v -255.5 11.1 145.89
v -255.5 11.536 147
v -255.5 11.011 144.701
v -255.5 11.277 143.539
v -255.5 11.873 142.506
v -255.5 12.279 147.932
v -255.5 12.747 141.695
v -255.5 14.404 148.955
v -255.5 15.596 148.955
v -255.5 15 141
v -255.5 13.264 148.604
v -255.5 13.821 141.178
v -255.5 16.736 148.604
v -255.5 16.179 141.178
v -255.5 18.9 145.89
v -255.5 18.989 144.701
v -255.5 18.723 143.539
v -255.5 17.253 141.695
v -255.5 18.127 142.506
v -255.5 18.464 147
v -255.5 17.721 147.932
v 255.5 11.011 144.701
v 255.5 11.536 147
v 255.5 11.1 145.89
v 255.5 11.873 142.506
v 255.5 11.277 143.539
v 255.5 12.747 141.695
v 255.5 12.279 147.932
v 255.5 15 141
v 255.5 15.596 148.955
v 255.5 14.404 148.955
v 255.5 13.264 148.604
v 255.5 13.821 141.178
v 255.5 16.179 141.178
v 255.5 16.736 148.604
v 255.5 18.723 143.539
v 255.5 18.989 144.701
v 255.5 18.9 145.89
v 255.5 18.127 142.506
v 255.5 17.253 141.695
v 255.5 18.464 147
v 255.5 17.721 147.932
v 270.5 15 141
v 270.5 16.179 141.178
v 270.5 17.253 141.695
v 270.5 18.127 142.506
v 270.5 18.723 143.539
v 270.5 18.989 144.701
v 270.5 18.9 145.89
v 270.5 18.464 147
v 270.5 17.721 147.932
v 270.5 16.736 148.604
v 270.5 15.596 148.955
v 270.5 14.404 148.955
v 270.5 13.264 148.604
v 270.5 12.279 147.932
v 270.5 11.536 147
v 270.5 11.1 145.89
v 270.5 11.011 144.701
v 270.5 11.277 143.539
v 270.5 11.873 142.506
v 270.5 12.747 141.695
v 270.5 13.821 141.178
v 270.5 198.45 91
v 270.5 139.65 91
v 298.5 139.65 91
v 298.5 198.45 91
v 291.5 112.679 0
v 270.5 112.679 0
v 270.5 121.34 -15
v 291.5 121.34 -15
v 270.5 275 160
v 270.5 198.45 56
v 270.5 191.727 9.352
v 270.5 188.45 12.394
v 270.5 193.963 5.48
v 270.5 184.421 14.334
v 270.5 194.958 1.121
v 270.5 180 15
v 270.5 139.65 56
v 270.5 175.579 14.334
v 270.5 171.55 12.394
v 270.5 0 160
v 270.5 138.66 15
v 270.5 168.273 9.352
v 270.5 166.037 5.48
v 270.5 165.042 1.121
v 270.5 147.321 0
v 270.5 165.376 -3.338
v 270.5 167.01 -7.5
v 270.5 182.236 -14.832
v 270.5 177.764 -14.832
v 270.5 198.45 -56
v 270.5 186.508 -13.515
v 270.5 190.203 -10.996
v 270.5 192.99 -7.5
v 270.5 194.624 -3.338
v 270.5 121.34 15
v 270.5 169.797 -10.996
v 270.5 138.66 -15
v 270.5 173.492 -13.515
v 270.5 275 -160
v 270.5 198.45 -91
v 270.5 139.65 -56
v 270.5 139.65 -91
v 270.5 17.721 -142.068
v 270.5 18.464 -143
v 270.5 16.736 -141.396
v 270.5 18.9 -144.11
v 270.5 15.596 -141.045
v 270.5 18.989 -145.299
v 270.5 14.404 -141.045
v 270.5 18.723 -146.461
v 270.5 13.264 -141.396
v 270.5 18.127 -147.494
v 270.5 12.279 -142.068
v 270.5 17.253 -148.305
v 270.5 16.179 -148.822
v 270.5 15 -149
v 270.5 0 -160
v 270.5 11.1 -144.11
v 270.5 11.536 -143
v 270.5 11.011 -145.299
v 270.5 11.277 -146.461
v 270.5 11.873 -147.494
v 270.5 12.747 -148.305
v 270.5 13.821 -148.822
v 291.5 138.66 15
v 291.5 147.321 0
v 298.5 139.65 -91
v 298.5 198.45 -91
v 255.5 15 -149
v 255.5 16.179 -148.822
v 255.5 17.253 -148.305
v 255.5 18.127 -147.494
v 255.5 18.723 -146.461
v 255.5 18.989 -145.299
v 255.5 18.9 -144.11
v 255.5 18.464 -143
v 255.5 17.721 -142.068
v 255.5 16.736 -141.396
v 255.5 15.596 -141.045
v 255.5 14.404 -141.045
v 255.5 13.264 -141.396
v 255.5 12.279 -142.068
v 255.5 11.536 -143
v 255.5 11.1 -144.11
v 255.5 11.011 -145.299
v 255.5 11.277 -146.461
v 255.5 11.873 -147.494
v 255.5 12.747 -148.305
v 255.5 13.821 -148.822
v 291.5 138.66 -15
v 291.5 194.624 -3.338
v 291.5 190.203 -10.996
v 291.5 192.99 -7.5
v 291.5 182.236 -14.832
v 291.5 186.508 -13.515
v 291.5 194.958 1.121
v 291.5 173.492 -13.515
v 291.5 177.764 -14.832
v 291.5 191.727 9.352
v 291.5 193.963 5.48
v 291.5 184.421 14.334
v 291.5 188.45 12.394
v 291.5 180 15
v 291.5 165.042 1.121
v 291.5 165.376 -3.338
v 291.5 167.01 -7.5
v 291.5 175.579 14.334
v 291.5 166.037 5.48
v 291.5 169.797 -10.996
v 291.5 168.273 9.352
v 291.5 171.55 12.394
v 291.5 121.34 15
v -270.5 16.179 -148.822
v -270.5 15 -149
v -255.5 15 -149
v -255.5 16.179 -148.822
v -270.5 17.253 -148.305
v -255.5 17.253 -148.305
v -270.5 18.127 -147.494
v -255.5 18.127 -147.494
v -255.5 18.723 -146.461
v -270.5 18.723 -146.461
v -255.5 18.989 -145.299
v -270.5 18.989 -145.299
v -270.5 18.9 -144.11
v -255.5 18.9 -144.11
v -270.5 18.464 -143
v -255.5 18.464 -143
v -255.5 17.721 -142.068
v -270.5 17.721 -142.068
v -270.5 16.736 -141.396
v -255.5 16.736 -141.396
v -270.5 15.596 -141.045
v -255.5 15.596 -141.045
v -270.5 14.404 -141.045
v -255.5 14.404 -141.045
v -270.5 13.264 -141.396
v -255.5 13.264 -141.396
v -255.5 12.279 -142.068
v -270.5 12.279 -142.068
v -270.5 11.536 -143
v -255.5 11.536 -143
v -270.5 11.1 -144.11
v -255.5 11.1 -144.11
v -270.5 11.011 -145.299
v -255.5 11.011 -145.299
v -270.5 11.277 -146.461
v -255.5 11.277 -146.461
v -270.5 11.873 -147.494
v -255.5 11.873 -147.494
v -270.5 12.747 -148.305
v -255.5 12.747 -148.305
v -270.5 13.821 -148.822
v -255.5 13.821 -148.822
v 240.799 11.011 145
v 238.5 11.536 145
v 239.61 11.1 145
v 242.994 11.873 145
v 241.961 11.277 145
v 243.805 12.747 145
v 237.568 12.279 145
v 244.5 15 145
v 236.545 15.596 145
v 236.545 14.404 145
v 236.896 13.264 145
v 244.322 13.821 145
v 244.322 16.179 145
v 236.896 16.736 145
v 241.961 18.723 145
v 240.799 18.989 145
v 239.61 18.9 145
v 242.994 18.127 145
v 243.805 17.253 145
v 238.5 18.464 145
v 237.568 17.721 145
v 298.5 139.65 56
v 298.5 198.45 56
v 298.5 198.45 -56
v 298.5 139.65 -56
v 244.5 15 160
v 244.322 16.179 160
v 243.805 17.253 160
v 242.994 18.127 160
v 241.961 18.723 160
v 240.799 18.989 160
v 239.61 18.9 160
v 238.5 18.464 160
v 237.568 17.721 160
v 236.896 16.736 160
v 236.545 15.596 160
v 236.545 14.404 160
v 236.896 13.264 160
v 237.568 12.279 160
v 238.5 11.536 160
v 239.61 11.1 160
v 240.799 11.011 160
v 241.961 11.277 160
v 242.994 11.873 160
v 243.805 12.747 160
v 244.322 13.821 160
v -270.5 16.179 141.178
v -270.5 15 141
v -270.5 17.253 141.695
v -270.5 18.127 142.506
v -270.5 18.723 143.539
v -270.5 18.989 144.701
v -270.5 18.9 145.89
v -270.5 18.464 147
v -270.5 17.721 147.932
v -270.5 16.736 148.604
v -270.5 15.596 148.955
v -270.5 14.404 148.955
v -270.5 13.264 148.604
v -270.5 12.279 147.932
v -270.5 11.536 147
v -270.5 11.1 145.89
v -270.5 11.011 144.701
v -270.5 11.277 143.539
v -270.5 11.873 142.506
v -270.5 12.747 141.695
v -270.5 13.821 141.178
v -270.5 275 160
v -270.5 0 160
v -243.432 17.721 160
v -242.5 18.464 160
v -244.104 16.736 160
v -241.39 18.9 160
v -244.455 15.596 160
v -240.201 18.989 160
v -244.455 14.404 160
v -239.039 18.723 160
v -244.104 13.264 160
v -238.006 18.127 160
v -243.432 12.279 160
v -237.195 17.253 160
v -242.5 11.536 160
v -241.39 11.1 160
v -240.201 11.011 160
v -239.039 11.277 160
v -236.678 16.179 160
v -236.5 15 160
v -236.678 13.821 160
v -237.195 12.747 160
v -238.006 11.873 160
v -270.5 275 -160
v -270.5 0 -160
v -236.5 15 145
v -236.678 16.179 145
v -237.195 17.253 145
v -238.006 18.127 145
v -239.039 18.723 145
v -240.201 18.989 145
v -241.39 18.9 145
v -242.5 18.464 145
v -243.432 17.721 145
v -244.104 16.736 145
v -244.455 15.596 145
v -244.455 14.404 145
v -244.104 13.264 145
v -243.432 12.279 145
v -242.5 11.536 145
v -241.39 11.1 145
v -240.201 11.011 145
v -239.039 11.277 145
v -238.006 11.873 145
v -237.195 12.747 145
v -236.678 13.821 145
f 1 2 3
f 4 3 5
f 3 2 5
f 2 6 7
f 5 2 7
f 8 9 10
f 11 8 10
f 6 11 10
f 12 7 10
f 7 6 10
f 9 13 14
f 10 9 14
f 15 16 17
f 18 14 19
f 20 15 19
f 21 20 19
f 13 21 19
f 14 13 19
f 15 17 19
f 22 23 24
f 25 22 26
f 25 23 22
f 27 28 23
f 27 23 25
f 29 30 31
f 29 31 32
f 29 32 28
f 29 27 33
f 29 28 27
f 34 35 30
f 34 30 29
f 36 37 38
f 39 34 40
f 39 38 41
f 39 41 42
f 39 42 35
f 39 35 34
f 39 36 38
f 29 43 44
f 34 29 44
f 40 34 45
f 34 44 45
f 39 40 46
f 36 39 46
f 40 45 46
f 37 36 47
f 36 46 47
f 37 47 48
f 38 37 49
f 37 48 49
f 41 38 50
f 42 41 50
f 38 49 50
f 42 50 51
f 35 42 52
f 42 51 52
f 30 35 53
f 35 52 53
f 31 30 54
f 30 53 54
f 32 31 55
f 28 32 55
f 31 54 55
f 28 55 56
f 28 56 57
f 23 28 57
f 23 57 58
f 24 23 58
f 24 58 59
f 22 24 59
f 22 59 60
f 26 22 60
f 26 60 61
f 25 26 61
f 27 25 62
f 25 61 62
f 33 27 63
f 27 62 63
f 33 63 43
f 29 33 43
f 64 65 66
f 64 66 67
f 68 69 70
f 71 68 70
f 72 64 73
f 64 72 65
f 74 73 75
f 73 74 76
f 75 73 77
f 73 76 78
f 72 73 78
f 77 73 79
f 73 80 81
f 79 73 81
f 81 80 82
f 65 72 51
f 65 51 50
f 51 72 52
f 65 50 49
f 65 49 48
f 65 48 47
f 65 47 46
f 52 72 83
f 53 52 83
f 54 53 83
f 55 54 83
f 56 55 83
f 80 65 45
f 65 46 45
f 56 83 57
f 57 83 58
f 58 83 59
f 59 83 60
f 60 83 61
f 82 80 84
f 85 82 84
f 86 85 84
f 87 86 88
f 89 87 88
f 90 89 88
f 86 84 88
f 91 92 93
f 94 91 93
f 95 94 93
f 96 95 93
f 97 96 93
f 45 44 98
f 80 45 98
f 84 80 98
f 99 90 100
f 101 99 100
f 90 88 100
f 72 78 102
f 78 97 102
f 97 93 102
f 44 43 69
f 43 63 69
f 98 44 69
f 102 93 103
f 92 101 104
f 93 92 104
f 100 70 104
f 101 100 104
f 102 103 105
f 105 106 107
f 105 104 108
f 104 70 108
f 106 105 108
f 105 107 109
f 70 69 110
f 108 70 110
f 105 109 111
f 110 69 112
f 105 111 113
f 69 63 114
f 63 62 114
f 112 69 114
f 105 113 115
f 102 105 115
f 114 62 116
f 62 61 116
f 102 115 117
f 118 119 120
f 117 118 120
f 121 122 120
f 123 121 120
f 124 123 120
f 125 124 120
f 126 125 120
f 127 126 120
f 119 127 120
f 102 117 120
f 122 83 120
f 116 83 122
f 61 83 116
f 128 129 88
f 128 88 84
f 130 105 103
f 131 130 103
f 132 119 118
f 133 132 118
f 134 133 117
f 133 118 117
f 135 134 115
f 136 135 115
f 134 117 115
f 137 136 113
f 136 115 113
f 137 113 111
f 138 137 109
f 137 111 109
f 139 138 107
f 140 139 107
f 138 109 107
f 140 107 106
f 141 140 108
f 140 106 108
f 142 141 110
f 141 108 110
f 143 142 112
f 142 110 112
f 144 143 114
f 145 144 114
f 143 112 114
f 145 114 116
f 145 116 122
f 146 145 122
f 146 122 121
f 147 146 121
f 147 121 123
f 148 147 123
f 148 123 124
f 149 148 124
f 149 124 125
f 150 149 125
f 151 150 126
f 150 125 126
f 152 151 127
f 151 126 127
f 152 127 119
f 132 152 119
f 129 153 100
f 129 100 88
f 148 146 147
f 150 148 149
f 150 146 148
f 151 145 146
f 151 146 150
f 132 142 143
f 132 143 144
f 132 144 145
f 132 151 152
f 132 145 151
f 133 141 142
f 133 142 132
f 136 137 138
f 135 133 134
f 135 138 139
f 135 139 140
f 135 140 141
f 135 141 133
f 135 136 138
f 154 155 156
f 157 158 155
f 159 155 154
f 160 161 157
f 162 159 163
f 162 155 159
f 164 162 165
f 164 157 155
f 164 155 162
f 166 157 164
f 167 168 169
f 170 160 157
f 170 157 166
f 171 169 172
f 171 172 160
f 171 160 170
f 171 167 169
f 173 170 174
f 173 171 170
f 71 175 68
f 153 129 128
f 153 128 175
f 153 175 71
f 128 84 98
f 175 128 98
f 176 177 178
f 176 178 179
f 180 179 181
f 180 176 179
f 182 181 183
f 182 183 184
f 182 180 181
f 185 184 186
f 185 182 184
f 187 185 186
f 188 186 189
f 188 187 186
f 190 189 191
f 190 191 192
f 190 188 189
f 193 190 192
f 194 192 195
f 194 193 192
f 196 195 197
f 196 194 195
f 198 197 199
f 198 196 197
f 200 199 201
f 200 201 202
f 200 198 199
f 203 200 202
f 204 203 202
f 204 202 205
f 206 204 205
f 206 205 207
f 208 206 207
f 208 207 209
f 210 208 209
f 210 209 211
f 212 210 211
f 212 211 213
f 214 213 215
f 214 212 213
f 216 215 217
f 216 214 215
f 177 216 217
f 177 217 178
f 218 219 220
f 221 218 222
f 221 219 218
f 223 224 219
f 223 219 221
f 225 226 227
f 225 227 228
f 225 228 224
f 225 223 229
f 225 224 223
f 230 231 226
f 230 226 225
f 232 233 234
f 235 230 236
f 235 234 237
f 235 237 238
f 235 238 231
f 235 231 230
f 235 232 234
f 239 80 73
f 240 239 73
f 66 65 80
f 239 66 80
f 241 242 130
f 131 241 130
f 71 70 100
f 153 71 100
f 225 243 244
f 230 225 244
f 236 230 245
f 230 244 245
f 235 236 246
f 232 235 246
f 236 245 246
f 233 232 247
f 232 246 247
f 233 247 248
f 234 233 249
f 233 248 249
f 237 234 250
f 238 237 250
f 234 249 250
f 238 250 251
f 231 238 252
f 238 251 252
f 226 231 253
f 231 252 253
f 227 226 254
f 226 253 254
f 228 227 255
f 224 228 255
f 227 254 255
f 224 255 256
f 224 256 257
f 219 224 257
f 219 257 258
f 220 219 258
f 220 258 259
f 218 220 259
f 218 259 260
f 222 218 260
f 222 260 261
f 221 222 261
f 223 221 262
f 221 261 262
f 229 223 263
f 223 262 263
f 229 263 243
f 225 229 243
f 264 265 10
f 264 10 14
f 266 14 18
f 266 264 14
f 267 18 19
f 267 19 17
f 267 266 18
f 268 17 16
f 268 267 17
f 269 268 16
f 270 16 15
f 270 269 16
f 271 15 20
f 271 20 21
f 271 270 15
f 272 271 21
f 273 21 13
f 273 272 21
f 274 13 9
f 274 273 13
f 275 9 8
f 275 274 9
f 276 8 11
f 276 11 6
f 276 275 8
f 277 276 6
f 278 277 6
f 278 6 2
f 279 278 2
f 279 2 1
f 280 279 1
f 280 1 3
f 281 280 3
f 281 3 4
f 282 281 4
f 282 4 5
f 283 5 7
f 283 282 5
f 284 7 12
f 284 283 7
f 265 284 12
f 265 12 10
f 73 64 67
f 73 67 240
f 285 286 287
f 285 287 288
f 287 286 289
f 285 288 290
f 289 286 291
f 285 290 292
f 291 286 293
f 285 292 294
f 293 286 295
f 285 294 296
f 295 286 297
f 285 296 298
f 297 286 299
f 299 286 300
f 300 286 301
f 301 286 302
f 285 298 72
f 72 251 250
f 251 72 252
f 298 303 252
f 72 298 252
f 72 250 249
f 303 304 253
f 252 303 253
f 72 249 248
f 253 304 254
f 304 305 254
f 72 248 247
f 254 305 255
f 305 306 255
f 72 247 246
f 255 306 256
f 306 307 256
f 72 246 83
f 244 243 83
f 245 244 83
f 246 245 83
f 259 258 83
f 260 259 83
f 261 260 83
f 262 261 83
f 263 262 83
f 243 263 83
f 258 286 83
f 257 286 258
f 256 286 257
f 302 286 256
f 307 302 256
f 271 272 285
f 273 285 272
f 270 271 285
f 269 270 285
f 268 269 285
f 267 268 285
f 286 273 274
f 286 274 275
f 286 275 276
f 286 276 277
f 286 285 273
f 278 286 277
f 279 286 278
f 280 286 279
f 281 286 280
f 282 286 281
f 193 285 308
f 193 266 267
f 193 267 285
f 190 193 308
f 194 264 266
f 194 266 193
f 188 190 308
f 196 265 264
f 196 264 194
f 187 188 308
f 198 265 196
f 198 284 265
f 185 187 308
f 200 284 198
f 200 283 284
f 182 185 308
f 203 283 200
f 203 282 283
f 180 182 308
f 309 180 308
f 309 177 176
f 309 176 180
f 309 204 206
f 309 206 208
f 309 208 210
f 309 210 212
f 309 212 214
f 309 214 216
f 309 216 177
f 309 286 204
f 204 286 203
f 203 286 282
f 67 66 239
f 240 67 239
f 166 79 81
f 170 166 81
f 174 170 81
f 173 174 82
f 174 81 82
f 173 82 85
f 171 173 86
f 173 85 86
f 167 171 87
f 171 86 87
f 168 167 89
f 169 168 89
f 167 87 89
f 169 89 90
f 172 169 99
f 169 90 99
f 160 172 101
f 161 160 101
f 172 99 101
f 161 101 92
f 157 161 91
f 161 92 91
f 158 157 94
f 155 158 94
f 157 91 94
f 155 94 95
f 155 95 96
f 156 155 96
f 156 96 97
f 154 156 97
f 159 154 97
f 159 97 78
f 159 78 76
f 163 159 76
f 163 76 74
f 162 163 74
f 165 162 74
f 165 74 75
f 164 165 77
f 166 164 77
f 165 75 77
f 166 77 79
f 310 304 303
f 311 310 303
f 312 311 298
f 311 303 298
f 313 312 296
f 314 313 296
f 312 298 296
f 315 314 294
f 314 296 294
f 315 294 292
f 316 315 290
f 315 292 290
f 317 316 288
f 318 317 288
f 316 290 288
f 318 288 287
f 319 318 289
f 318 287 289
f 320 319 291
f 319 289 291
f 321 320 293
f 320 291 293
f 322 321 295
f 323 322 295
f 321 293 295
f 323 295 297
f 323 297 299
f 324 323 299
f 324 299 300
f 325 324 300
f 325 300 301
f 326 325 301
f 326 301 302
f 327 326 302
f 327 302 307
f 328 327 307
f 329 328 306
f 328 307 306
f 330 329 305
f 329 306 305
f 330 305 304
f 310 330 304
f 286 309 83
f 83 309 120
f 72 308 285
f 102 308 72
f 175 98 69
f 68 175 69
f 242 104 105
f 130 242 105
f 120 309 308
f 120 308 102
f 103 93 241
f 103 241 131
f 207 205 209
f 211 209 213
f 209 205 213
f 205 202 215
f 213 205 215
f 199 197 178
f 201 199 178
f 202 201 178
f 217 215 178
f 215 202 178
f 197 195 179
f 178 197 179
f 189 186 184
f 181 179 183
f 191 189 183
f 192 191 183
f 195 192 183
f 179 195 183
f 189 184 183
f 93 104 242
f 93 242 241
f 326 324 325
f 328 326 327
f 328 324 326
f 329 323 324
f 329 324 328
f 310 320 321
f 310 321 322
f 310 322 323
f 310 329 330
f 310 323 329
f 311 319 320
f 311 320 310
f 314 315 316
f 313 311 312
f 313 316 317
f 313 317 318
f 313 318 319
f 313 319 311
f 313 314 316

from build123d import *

# Parameters (mm, degrees)
SCHIZZO1_W                   = 541
SCHIZZO1_H                   = 320
ESTRUSIONE_ESTRUSIONE1_DEPTH = 275
SCHIZZO2_W                   = 35
SCHIZZO2_H                   = 58.8
ESTRUSIONE_ESTRUSIONE2_DEPTH = 28
SCHIZZO3_R                   = 15
ESTRUSIONE_ESTRUSIONE3_DEPTH = 21
SCHIZZO4_R                   = 4
TAGLIO_ESTRUSIONE1_DEPTH     = 15
SCHIZZO5_R                   = 4
TAGLIO_ESTRUSIONE2_DEPTH     = 15


with BuildPart() as part:
    # Schizzo1 → Estrusione-Estrusione1 (new body)
    with BuildSketch(Plane(origin=(0, 0, 0), x_dir=(1, 0, 0), z_dir=(0, 1, 0))):
        Rectangle(SCHIZZO1_W, SCHIZZO1_H)
    extrude(amount=ESTRUSIONE_ESTRUSIONE1_DEPTH)

    # Schizzo2 → Estrusione-Estrusione2 (add)
    with BuildSketch(Plane(origin=(270.5, 0, 0), x_dir=(0, 0, -1), z_dir=(1, 0, 0))):
        with Locations((-73.5, 169.05)):
            Rectangle(SCHIZZO2_W, SCHIZZO2_H)
        with Locations((73.5, 169.05)):
            Rectangle(SCHIZZO2_W, SCHIZZO2_H)
    extrude(amount=ESTRUSIONE_ESTRUSIONE2_DEPTH)

    # Schizzo3 → Estrusione-Estrusione3 (add)
    with BuildSketch(Plane(origin=(270.5, 0, 0), x_dir=(0, 0, -1), z_dir=(1, 0, 0))):
        with Locations(Location((0, 180, 0), (0, 0, 180))):
            Circle(SCHIZZO3_R)
        Polygon((0, 147.320508076), (-15, 138.660254038), (-15, 121.339745962), (0, 112.679491924), (15, 121.339745962), (15, 138.660254038), align=None)
    extrude(amount=ESTRUSIONE_ESTRUSIONE3_DEPTH)

    # Schizzo4 → Taglio-Estrusione1 (cut)
    with BuildSketch(Plane(origin=(270.5, 0, 0), x_dir=(0, 0, -1), z_dir=(1, 0, 0))):
        with Locations((-145, 15)):
            Circle(SCHIZZO4_R)
        with Locations((145, 15)):
            Circle(SCHIZZO4_R)
    taglio_estrusione1 = extrude(amount=-TAGLIO_ESTRUSIONE1_DEPTH, mode=Mode.SUBTRACT)

    # Specchia1: Taglio-Estrusione1 across plane
    add(taglio_estrusione1.mirror(Plane(origin=(0, 0, 0), x_dir=(0, 0, 1), z_dir=(1, 0, 0))), mode=Mode.SUBTRACT)

    # Schizzo5 → Taglio-Estrusione2 (cut)
    with BuildSketch(Plane.XY.offset(160)):
        with Locations((-240.5, 15)):
            Circle(SCHIZZO5_R)
        with Locations((240.5, 15)):
            Circle(SCHIZZO5_R)
    extrude(amount=-TAGLIO_ESTRUSIONE2_DEPTH, mode=Mode.SUBTRACT)


solid = part.part
